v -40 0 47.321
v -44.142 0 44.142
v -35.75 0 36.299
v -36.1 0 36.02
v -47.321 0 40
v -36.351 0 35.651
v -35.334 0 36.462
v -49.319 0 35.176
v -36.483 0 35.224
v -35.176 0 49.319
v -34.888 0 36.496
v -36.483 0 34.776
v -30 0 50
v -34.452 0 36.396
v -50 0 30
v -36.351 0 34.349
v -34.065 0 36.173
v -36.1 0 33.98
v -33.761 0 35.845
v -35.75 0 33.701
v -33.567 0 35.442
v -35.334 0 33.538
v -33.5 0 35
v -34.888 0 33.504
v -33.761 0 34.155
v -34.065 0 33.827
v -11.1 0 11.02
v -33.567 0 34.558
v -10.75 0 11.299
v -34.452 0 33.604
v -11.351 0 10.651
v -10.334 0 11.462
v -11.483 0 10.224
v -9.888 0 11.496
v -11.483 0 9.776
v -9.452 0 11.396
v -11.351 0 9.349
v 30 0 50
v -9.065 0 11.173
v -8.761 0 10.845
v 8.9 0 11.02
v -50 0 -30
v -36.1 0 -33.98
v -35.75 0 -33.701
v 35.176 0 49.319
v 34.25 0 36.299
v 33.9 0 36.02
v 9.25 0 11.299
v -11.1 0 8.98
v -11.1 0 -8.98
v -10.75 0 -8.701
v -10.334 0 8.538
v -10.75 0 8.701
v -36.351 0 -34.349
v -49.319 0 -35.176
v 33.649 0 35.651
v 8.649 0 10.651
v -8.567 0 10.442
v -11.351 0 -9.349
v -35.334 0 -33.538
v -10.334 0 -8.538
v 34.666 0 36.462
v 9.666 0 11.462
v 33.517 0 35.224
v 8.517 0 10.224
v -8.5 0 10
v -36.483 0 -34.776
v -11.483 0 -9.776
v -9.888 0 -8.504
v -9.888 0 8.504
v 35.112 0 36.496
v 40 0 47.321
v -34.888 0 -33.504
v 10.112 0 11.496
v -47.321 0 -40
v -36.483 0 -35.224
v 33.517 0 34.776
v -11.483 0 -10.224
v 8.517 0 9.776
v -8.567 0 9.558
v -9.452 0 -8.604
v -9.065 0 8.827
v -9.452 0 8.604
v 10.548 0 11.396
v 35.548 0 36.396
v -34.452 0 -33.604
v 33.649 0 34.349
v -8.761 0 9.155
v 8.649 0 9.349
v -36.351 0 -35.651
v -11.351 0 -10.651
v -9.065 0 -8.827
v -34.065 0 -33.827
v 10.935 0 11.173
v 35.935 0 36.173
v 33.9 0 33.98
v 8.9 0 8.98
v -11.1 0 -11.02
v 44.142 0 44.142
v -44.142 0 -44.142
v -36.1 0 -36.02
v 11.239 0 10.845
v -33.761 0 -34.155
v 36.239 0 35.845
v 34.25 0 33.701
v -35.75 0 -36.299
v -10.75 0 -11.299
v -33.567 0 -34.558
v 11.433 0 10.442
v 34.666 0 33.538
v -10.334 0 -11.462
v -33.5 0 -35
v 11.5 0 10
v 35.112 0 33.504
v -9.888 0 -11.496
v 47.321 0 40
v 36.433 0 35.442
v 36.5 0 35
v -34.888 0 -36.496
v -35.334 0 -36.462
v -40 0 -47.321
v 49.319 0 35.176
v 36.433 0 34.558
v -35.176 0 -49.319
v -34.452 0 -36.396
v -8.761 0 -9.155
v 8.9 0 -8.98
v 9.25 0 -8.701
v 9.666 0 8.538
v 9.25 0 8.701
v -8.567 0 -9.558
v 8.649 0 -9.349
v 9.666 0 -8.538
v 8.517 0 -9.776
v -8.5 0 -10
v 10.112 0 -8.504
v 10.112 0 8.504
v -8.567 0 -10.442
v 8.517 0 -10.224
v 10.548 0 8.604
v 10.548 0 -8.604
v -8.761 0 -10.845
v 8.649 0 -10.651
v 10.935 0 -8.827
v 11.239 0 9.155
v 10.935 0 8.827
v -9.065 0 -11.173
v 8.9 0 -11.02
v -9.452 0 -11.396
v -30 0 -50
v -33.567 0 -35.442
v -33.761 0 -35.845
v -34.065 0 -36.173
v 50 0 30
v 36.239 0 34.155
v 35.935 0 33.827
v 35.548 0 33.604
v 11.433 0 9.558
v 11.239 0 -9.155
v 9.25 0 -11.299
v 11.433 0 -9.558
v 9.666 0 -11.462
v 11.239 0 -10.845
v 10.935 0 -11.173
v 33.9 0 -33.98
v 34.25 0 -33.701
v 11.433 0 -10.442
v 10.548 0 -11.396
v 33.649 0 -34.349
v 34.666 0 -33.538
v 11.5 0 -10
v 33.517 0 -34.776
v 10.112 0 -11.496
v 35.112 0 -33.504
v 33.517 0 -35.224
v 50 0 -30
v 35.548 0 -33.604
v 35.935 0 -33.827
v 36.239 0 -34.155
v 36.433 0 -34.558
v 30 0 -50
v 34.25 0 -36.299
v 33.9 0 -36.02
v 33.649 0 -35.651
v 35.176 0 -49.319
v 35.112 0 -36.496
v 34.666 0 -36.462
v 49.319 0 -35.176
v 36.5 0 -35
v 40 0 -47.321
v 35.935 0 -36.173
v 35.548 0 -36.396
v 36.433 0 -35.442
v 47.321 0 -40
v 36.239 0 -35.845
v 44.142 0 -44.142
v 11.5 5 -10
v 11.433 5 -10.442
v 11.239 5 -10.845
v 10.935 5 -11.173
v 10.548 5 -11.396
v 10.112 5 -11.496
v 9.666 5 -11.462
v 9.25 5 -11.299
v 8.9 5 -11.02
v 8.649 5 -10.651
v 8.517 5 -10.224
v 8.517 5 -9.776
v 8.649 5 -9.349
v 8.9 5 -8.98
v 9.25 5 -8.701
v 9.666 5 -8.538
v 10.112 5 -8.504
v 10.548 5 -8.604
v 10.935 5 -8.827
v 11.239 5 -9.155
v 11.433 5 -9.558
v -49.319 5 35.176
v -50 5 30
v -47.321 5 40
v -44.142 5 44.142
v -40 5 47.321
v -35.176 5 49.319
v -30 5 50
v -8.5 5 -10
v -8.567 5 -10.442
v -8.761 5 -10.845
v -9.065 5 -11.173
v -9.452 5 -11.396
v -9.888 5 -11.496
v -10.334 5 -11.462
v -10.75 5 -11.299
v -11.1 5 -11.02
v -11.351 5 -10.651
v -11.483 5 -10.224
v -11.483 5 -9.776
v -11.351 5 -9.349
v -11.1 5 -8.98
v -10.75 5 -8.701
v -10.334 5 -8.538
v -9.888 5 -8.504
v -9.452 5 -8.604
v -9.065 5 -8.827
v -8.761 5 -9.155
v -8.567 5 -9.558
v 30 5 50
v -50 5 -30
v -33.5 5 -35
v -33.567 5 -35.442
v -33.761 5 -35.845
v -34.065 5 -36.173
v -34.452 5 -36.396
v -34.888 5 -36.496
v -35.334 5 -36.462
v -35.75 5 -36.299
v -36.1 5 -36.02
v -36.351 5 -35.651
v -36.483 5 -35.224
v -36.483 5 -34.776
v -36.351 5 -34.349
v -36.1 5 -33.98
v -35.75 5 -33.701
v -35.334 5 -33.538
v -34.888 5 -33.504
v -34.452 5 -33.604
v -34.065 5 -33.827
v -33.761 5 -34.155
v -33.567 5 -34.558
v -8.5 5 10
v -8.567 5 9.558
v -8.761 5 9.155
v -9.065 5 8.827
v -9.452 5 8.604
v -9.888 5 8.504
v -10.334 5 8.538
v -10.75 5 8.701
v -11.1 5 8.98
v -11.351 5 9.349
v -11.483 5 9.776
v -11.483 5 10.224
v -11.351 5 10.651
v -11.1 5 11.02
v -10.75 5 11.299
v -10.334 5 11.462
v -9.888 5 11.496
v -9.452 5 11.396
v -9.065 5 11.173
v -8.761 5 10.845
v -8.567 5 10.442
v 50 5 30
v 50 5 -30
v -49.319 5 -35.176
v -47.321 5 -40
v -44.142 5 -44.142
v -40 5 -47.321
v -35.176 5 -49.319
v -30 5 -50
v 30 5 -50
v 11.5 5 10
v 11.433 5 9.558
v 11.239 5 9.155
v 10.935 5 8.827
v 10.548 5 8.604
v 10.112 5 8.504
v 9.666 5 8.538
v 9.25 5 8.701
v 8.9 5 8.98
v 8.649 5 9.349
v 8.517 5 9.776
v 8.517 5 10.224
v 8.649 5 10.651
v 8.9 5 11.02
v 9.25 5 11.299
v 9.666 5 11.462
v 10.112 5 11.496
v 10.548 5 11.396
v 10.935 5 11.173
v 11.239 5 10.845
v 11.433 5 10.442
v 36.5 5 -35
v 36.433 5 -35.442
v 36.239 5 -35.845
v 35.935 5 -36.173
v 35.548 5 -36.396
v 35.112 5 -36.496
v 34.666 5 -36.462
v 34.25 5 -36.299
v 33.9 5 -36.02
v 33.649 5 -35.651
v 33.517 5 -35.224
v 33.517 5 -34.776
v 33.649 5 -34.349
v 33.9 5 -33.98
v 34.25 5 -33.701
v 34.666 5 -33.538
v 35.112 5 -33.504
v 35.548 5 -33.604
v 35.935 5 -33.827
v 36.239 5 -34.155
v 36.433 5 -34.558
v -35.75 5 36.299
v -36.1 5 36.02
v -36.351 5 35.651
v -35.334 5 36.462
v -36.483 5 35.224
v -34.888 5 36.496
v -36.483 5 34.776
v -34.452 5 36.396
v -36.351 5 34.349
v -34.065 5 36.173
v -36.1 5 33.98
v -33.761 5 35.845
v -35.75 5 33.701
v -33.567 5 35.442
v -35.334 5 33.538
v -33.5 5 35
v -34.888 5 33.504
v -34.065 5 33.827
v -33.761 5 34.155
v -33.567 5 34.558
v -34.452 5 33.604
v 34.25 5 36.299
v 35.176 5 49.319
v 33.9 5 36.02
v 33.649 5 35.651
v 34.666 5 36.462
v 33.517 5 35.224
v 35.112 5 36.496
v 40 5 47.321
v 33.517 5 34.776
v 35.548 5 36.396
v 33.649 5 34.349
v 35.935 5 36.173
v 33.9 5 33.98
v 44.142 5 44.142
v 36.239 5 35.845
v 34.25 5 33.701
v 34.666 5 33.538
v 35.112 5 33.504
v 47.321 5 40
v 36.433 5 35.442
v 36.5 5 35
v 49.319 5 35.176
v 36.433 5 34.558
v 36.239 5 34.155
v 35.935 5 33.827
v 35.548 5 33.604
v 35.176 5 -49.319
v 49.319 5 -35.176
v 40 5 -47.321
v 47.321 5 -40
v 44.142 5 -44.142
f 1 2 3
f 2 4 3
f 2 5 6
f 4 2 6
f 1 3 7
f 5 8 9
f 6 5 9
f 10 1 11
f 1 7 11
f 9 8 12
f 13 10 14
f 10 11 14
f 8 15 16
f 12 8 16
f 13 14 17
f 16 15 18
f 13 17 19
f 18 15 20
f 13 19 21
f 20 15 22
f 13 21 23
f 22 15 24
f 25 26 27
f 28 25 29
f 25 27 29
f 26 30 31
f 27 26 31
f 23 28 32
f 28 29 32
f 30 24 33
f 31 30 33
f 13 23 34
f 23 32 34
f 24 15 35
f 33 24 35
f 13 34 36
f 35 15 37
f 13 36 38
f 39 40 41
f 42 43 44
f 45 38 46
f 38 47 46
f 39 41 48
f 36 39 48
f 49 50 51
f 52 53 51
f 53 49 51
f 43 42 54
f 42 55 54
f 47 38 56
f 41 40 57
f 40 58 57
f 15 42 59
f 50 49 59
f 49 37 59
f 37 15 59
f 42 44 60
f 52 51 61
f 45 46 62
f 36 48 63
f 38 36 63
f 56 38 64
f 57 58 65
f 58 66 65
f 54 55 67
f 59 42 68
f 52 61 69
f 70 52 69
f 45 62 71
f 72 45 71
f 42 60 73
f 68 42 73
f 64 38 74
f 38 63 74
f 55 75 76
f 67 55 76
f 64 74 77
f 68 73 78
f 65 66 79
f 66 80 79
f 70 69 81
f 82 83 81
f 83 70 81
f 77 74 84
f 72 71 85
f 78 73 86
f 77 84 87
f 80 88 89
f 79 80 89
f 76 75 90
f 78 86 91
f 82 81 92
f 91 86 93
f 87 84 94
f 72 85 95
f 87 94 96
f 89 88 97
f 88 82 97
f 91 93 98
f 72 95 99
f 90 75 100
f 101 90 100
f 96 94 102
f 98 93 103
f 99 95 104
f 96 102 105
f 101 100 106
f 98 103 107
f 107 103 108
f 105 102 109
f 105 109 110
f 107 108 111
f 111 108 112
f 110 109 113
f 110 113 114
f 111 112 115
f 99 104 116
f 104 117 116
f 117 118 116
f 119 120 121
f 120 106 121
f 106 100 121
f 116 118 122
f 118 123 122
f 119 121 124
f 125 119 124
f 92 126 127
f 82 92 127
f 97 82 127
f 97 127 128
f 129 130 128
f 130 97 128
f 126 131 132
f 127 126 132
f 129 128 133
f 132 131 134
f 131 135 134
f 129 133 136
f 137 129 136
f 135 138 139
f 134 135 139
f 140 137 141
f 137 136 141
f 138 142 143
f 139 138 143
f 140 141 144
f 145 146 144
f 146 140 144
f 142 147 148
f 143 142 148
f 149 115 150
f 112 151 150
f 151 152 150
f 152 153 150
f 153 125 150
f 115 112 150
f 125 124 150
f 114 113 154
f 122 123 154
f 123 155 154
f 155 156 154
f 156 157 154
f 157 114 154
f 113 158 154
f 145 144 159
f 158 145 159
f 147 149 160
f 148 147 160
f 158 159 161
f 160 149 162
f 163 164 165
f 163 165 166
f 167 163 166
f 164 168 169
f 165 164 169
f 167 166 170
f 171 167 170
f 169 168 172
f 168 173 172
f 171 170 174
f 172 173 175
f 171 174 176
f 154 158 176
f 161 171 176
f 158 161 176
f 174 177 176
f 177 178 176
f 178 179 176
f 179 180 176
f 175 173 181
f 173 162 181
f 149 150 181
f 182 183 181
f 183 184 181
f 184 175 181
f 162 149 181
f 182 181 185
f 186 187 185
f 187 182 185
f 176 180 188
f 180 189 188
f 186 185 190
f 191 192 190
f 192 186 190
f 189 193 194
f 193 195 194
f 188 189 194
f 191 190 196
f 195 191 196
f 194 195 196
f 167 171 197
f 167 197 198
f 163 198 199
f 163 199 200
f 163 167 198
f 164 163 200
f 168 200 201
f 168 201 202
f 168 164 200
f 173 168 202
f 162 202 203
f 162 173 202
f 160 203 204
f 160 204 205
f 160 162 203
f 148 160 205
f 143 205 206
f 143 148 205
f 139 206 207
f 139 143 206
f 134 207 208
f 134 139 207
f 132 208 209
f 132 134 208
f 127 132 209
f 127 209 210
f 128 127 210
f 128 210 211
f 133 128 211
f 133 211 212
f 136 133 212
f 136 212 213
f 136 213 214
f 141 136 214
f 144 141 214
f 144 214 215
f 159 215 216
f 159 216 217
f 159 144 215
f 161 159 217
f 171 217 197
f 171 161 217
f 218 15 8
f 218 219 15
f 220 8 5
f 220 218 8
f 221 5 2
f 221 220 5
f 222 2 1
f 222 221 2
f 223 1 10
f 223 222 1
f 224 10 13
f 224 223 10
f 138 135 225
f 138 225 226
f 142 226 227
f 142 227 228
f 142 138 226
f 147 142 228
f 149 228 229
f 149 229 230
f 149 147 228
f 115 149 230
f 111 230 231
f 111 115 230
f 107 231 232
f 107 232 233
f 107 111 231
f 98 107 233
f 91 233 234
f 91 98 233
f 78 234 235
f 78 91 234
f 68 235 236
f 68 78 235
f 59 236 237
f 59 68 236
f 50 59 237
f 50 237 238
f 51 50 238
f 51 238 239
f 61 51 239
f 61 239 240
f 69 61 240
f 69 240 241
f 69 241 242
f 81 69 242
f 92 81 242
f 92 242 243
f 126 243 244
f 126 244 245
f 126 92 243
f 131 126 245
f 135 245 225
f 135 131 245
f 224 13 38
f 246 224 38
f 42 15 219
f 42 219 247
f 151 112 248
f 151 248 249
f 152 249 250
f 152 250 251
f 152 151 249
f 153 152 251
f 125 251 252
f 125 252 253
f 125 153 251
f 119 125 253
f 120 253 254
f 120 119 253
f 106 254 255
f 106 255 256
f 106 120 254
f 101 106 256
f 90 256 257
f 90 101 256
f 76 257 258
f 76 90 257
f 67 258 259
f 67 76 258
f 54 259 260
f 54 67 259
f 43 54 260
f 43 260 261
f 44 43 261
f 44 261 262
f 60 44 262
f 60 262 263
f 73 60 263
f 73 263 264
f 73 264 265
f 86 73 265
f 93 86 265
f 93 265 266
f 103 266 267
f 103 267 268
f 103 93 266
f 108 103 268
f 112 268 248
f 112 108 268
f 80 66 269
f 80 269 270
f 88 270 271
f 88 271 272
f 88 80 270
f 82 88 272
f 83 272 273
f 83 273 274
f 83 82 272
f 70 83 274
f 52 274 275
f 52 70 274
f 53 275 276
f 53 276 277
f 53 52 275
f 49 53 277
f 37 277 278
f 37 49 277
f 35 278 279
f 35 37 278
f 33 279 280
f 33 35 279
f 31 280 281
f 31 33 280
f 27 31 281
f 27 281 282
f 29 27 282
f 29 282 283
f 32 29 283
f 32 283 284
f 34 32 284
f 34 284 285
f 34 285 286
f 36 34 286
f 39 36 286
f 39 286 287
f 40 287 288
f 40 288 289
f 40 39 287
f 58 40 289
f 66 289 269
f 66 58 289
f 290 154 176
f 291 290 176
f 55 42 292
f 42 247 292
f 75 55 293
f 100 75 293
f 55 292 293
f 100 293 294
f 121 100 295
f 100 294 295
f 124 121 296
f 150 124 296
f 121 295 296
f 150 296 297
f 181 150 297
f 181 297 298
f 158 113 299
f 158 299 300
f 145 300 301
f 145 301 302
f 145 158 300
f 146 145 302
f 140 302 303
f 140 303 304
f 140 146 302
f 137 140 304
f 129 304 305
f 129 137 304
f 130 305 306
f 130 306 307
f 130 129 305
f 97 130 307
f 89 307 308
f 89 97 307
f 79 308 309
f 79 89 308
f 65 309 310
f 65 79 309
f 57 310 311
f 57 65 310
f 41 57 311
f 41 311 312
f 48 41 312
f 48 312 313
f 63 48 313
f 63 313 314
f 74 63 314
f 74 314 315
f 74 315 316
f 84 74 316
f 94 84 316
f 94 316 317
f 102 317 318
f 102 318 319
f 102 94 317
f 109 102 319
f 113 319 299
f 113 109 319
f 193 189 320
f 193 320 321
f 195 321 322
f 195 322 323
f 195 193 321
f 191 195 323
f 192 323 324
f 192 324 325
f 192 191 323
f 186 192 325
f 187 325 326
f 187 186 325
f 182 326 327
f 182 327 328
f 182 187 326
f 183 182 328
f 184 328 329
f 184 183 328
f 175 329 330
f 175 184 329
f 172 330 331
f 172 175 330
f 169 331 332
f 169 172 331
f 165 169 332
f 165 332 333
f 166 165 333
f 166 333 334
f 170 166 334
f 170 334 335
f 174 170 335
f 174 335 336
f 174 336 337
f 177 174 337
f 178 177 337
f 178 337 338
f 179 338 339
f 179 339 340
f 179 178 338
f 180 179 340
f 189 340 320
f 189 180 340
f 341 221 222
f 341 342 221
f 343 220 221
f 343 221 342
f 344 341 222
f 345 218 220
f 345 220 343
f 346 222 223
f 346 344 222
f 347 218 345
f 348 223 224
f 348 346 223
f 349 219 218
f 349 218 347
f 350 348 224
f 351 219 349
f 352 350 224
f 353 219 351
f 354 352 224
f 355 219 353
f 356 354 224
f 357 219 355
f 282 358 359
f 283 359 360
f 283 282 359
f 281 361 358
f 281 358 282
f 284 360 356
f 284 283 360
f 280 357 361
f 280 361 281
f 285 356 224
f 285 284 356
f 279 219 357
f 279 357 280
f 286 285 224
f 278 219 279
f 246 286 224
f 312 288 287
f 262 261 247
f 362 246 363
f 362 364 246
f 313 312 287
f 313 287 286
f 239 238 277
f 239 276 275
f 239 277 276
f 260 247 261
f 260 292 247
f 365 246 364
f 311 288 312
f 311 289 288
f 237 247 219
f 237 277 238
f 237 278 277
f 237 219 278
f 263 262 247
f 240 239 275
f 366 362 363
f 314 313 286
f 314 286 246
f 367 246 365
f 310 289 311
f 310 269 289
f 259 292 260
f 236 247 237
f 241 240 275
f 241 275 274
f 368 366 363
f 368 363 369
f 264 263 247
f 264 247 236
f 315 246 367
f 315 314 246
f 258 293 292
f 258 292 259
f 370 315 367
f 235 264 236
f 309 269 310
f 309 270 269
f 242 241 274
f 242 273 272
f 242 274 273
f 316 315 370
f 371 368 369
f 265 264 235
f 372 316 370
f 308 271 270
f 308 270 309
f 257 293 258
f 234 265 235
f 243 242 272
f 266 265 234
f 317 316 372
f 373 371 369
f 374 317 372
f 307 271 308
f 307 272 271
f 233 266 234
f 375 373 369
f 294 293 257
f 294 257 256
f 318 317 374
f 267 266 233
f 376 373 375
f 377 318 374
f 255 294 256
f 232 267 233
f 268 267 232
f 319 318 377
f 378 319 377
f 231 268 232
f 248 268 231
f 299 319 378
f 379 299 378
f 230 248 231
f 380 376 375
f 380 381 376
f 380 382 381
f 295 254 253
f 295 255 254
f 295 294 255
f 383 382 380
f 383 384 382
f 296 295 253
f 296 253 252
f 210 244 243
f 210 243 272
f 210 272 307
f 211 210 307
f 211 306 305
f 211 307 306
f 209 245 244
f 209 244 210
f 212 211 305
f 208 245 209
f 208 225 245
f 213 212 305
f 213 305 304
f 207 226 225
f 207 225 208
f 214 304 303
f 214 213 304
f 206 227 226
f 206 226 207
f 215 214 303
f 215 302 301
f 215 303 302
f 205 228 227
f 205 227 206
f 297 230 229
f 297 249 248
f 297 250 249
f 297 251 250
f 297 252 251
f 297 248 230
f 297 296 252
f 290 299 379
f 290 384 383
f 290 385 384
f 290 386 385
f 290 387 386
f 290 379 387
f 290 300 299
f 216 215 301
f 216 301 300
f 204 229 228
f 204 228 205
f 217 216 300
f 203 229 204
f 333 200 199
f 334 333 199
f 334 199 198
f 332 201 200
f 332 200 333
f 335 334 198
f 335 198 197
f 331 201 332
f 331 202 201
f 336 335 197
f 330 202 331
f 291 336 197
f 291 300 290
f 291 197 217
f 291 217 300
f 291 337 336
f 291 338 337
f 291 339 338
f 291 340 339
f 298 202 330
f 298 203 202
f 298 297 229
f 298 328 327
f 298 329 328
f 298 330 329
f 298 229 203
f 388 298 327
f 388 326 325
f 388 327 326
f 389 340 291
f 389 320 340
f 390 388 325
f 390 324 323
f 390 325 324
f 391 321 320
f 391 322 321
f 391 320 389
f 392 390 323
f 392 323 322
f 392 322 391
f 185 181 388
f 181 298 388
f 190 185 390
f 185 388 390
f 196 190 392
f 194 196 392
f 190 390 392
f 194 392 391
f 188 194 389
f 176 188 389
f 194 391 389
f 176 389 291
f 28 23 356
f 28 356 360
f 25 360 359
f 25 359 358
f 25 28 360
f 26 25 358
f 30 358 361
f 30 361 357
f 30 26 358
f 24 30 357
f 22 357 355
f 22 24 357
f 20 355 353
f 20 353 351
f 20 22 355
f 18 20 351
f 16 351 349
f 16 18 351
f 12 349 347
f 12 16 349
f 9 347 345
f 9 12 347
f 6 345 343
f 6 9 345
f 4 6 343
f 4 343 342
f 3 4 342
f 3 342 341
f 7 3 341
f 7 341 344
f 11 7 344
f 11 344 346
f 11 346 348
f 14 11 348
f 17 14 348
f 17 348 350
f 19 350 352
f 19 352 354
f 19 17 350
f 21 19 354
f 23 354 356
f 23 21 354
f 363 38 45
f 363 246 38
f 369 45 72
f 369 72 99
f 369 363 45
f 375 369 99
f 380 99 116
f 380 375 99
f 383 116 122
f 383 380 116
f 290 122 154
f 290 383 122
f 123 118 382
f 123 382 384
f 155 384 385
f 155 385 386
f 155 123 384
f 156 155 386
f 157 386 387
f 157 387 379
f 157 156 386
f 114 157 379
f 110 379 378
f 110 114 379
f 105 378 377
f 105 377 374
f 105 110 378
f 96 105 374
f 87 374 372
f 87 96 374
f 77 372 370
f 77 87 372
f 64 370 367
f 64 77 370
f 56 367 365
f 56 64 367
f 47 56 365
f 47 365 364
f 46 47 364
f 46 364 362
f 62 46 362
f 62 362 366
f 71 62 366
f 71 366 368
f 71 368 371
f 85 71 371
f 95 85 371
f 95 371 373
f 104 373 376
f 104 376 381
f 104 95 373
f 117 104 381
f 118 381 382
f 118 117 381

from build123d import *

# Parameters (mm, degrees)
SKETCH_1_W      = 100
SKETCH_1_H      = 100
SKETCH_1_R      = 1.5
EXTRUDE_1_DEPTH = 5
FILLET_1_R      = 20


with BuildPart() as part:
    # 草图1 → 凸台-拉伸1 (new body)
    with BuildSketch(Plane(origin=(0, 0, 0), x_dir=(1, 0, 0), z_dir=(0, 1, 0))):
        Rectangle(SKETCH_1_W, SKETCH_1_H)
        with Locations((-35, 35)):
            Circle(SKETCH_1_R, mode=Mode.SUBTRACT)
        with Locations((35, 35)):
            Circle(SKETCH_1_R, mode=Mode.SUBTRACT)
        with Locations((35, -35)):
            Circle(SKETCH_1_R, mode=Mode.SUBTRACT)
        with Locations((-35, -35)):
            Circle(SKETCH_1_R, mode=Mode.SUBTRACT)
        with Locations((-10, 10)):
            Circle(SKETCH_1_R, mode=Mode.SUBTRACT)
        with Locations((10, 10)):
            Circle(SKETCH_1_R, mode=Mode.SUBTRACT)
        with Locations((10, -10)):
            Circle(SKETCH_1_R, mode=Mode.SUBTRACT)
        with Locations((-10, -10)):
            Circle(SKETCH_1_R, mode=Mode.SUBTRACT)
    extrude(amount=EXTRUDE_1_DEPTH)

    # 圆角1
    fillet_1_edges = [part.edges().sort_by_distance(p)[0] for p in [
        (-50, 2.5, -50),
        (50, 2.5, -50),
        (50, 2.5, 50),
        (-50, 2.5, 50),
    ]]
    fillet(fillet_1_edges, radius=FILLET_1_R)


solid = part.part
